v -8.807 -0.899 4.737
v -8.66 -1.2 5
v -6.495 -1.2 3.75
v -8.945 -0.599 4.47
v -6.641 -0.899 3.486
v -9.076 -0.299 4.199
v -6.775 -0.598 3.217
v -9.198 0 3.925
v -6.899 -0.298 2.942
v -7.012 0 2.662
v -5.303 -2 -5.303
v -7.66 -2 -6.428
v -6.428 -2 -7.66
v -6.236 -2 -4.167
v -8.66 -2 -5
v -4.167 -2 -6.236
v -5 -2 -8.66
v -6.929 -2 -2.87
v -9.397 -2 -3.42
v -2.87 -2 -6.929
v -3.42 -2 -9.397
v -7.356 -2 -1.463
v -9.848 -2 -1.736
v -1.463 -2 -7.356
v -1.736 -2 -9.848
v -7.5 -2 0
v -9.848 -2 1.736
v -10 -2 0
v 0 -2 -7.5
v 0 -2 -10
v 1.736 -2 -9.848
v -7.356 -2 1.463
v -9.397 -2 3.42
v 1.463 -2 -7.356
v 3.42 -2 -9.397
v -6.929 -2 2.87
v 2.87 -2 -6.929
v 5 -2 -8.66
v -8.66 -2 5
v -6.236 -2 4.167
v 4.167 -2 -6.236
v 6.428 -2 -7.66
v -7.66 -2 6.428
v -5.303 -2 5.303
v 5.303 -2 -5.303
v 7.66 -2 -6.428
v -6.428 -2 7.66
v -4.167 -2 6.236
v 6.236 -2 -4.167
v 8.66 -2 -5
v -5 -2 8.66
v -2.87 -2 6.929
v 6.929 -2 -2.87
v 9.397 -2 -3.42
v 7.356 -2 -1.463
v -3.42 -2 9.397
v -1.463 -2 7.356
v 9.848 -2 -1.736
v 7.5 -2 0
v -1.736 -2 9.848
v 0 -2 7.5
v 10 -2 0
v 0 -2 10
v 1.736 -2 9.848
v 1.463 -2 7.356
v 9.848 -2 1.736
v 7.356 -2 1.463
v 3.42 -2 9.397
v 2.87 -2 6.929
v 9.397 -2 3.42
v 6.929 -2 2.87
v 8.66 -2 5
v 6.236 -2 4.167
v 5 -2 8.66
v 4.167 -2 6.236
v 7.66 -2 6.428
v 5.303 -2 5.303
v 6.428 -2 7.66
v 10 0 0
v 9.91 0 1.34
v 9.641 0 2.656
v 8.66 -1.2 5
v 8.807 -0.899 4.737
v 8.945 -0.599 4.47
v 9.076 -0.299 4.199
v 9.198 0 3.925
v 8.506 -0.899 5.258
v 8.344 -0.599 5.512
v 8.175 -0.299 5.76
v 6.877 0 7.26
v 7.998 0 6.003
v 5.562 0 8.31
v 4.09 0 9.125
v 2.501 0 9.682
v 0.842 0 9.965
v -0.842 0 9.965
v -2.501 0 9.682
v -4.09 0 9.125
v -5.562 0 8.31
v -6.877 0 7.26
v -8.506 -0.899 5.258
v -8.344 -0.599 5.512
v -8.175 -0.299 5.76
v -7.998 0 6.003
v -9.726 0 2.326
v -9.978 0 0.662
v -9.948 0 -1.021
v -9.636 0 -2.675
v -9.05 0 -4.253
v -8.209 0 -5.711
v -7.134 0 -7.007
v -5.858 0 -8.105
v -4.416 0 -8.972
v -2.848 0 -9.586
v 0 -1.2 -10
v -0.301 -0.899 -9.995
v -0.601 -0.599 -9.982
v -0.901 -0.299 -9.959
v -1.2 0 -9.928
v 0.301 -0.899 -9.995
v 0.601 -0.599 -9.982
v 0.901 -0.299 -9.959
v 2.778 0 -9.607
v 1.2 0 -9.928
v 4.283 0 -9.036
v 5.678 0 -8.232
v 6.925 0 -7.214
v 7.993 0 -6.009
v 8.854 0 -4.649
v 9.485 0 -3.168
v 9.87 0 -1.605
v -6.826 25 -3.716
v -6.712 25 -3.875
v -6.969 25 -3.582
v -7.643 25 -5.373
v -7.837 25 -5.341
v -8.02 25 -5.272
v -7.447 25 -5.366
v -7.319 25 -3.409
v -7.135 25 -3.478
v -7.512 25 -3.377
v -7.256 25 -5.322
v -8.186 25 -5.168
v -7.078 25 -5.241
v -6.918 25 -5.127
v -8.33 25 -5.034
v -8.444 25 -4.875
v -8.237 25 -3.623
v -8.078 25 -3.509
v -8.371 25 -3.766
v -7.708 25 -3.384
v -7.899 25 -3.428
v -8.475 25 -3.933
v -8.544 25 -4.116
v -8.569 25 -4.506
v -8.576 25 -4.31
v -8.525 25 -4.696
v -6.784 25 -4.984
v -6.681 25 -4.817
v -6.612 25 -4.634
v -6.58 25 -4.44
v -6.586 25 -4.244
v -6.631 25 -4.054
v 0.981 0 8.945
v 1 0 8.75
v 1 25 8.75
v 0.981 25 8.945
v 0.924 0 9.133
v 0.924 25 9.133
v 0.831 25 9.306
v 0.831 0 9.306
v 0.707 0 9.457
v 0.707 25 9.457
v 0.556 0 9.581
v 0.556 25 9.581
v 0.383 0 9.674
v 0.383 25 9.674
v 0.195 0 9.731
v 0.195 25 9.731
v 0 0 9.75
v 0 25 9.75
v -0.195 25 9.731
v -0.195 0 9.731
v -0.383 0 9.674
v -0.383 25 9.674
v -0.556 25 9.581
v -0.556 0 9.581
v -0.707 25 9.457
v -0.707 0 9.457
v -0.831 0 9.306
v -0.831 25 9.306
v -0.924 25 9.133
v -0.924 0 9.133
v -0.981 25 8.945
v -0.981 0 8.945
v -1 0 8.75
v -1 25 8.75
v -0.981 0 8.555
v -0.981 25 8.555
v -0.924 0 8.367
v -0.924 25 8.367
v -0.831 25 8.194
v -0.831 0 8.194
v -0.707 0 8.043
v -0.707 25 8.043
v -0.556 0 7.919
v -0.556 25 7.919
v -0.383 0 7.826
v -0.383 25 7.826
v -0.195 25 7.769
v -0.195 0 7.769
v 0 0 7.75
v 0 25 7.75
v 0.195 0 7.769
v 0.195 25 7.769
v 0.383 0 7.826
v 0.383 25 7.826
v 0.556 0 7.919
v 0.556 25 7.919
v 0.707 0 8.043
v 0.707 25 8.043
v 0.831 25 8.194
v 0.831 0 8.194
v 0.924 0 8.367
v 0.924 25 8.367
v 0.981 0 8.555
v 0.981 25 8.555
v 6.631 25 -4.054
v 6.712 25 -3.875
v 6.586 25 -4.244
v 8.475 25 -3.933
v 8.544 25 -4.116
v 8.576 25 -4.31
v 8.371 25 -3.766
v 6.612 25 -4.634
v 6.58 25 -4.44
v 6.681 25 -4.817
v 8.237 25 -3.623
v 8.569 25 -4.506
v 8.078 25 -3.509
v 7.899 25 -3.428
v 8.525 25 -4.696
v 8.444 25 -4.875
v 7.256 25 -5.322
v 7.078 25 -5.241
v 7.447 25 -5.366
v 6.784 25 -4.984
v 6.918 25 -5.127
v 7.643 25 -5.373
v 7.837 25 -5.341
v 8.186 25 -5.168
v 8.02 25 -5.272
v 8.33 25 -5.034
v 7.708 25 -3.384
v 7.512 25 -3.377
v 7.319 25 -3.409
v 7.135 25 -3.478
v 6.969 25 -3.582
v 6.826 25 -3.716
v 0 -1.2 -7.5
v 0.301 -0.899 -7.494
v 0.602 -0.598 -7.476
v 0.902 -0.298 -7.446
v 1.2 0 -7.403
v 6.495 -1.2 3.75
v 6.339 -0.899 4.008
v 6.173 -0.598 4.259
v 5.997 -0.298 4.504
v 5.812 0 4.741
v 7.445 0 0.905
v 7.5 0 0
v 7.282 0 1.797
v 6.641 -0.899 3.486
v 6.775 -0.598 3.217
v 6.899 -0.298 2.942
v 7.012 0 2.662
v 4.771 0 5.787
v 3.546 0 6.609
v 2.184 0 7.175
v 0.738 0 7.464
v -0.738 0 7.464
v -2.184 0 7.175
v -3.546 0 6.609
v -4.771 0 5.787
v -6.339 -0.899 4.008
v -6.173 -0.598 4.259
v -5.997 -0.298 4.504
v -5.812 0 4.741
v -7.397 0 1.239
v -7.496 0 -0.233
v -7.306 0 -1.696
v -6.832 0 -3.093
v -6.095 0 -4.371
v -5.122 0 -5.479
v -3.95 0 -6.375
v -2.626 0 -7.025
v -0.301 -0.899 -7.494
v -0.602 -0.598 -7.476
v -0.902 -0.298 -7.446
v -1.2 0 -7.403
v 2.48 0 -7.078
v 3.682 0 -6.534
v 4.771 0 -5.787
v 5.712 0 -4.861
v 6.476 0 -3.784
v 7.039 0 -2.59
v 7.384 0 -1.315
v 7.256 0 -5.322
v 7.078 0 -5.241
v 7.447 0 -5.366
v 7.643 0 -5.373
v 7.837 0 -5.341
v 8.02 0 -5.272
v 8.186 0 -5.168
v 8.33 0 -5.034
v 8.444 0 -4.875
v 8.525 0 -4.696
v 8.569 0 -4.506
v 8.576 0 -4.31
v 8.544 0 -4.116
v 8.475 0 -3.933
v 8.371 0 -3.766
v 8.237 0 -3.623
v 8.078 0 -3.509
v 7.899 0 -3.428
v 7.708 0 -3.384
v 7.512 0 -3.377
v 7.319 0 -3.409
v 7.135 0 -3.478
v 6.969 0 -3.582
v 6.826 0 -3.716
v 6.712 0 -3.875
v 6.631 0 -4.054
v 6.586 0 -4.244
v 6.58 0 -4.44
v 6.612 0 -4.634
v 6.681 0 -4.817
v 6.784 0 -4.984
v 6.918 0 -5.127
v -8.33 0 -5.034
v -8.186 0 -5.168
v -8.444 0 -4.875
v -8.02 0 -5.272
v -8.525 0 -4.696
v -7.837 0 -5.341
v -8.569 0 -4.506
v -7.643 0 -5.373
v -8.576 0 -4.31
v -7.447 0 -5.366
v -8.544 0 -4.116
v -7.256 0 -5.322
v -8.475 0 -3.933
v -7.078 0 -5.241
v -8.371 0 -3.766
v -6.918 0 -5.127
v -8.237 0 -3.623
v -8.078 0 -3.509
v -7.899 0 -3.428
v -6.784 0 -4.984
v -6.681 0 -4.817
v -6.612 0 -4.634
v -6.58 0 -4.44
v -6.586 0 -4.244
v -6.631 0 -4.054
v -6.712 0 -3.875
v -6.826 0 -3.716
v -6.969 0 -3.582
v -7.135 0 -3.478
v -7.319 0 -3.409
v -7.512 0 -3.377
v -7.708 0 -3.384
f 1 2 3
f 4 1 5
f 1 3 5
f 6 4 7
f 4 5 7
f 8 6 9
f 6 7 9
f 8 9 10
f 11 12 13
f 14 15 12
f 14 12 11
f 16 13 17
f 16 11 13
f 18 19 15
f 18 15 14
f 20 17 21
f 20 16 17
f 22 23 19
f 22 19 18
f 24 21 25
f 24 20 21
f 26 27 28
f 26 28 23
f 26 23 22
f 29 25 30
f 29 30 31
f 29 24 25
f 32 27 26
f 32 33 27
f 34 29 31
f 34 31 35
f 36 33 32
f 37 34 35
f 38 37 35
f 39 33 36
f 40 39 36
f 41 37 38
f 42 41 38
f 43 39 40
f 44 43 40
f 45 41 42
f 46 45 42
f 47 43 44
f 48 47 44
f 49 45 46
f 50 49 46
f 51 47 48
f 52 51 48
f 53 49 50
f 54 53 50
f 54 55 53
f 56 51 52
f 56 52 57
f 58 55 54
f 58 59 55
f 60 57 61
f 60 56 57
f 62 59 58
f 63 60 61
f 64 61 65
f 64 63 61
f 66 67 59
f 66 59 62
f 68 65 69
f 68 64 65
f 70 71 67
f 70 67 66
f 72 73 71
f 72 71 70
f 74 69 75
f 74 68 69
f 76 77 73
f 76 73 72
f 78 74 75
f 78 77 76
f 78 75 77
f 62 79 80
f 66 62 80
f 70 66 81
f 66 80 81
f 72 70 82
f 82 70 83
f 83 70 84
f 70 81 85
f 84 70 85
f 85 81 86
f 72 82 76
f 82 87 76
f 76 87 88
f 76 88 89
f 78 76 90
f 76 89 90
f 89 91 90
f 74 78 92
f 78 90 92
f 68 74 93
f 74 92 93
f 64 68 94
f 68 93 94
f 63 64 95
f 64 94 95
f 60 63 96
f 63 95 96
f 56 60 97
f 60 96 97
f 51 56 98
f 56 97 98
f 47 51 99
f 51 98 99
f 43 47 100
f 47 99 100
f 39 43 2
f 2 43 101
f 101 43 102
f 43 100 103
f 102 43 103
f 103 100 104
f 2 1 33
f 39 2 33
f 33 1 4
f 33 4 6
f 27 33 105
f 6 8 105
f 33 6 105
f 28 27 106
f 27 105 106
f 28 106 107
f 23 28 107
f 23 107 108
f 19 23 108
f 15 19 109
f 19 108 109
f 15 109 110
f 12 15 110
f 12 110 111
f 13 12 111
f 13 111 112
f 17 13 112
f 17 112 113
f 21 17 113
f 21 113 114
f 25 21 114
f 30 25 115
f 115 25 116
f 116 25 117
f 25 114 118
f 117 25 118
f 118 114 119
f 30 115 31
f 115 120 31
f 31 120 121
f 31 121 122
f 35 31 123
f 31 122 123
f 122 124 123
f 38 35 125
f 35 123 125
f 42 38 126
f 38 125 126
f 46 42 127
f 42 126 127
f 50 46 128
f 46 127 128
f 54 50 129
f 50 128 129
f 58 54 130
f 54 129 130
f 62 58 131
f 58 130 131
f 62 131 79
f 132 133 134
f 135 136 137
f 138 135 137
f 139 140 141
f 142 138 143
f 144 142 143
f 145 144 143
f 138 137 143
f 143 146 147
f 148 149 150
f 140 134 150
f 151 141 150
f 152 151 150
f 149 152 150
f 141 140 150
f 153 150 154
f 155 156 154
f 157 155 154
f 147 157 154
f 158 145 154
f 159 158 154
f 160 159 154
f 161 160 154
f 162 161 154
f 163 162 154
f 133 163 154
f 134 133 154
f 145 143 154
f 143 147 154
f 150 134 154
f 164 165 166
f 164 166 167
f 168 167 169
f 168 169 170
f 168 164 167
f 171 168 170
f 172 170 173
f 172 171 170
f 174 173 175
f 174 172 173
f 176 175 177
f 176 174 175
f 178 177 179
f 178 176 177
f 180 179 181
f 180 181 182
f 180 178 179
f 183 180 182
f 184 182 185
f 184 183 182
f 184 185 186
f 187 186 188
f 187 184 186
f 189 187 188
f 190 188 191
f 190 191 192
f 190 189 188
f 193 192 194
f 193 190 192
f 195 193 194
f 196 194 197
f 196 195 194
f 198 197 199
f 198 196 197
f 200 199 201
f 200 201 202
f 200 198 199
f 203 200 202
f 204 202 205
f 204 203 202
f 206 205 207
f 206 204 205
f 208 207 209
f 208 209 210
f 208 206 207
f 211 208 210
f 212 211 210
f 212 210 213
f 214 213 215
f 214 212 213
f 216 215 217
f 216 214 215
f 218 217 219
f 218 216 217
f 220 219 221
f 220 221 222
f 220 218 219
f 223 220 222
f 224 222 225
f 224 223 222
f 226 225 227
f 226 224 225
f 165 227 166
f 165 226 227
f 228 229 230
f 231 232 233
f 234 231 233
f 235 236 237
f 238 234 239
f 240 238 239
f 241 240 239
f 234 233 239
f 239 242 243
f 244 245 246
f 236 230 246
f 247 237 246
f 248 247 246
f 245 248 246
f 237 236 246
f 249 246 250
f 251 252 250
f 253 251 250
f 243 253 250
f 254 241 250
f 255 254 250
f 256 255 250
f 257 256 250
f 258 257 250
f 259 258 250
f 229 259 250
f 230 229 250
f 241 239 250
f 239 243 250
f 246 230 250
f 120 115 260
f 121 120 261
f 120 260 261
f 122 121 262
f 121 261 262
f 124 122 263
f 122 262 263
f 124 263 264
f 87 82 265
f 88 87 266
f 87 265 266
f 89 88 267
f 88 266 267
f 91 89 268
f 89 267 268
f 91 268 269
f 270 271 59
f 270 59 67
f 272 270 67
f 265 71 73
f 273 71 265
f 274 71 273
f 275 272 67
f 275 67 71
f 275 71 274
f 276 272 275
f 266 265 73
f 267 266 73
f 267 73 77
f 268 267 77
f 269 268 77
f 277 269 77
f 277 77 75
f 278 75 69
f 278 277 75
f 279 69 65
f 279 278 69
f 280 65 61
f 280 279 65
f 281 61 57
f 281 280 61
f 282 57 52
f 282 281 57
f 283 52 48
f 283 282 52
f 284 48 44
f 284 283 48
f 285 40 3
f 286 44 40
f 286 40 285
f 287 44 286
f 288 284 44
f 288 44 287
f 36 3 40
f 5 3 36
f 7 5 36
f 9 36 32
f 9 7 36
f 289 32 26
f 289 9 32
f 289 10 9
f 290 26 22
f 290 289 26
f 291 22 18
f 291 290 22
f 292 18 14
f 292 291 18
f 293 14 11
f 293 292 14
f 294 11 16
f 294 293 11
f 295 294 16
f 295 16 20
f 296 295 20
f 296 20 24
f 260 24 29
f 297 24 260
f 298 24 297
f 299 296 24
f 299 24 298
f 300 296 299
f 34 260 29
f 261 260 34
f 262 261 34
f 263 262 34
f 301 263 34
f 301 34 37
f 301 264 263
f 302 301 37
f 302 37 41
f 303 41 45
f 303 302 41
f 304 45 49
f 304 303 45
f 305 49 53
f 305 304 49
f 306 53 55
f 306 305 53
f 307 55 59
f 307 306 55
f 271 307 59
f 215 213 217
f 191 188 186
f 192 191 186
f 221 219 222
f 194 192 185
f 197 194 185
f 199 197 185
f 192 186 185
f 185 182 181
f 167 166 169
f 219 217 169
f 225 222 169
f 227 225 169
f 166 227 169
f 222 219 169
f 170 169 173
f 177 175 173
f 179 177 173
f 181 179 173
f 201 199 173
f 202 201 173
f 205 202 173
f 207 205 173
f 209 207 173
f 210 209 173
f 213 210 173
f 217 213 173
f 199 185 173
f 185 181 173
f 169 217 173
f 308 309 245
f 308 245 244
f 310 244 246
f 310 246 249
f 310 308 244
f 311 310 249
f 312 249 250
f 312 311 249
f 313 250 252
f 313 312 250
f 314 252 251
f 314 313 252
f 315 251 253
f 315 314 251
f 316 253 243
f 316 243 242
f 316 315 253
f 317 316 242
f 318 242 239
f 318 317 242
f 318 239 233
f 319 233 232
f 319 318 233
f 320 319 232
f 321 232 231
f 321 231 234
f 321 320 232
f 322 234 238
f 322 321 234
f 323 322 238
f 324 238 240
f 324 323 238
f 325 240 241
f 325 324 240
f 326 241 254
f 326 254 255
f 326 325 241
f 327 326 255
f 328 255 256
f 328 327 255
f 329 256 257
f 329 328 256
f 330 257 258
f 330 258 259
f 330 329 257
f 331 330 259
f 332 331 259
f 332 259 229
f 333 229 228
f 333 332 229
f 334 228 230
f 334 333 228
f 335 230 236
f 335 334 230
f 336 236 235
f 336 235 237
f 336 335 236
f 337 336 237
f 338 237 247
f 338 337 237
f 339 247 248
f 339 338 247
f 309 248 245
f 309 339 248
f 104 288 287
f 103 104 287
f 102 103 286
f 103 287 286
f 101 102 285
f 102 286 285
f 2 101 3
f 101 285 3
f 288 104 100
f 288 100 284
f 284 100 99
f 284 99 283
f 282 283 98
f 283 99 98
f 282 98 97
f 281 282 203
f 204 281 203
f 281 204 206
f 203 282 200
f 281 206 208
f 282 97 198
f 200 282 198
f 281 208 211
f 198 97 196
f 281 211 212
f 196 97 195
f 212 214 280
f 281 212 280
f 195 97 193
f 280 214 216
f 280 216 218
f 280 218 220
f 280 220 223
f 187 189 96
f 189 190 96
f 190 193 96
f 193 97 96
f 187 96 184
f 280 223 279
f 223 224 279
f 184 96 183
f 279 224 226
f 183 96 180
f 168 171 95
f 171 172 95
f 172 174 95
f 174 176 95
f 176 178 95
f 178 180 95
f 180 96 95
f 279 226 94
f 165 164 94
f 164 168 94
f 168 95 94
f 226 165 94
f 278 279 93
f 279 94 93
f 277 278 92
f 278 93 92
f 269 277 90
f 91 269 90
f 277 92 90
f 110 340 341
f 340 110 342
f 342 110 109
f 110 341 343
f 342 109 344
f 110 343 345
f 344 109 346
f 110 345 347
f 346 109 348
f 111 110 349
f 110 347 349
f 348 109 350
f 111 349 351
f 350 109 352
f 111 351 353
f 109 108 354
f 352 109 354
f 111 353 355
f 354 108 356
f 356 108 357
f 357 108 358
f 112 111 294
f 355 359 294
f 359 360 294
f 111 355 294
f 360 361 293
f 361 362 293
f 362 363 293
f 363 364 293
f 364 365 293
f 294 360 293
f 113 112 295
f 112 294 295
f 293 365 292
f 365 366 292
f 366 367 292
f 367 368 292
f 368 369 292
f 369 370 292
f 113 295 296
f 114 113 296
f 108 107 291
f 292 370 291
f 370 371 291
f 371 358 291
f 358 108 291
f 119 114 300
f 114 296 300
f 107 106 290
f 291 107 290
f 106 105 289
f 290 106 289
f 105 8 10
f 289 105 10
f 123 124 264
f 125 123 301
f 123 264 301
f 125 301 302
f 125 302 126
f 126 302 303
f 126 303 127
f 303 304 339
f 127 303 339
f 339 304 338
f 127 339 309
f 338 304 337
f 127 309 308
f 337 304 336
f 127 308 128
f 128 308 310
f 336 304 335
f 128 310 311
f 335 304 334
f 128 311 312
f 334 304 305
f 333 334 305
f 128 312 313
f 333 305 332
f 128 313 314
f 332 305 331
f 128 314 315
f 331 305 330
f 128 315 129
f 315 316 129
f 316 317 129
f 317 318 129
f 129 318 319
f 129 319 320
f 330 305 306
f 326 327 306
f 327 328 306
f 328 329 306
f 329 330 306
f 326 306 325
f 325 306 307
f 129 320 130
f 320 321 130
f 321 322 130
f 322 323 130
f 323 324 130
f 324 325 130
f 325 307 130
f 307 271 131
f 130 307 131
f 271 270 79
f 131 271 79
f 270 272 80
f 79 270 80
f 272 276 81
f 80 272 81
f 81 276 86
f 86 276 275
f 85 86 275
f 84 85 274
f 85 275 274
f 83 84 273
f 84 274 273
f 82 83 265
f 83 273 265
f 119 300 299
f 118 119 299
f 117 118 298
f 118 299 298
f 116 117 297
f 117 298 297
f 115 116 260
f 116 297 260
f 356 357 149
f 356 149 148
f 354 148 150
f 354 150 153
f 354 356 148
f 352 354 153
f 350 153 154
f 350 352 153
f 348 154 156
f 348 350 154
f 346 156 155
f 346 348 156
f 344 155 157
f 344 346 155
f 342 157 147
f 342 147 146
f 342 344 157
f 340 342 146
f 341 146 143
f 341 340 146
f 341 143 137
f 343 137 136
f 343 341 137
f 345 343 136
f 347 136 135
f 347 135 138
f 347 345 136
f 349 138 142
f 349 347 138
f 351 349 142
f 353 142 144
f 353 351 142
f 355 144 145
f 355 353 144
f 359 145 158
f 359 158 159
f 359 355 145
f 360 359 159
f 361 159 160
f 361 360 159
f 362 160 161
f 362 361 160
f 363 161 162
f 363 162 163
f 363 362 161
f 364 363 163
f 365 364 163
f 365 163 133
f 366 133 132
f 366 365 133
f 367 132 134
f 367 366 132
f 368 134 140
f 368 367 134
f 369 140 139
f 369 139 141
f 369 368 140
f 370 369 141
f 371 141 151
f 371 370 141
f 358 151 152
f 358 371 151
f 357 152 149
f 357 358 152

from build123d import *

# Parameters (mm, degrees)
F0_R            = 10
F0_R_2          = 7.5
F1_DEPTH        = 2
F3_DEPTH        = 25
F3_COPIES_COUNT = 3
F4_R            = 1
F5_DEPTH        = 25
F5_COPIES_COUNT = 3


# Not quite as in the source:
# - a pattern or mirror of a feature is missing from the dataset's text; its kind, count and spacing are read off the source's solid


with BuildPart() as f1:
    # F0 (on Front) → F1 (new body)
    with BuildSketch(Plane.XZ):
        Circle(F0_R)
        Circle(F0_R_2, mode=Mode.SUBTRACT)
    extrude(amount=F1_DEPTH)

    # F2 (on Top) → F3 (cut)
    with BuildSketch(Plane.XY):
        Polygon((-1.2, 0), (0, -1.2), (1.2, 0), align=None)
    f3 = extrude(amount=-F3_DEPTH, mode=Mode.SUBTRACT)

    # F3_copies: F3 ×3 about axis
    f3_copies_axis = Axis((0, 0, 0), (0, 1, 0))
    for i in range(1, F3_COPIES_COUNT):
        add(f3.rotate(f3_copies_axis, i * 360 / F3_COPIES_COUNT), mode=Mode.SUBTRACT)

    # F4 (on Front) → F5 (join)
    with BuildSketch(Plane.XZ):
        with Locations((0, 8.75)):
            Circle(F4_R)
    f5 = extrude(amount=-F5_DEPTH)

    # F5_copies: F5 ×3 about axis
    f5_copies_axis = Axis((0, 0, 0), (0, 1, 0))
    for i in range(1, F5_COPIES_COUNT):
        add(f5.rotate(f5_copies_axis, i * 360 / F5_COPIES_COUNT))


solid = f1.part
